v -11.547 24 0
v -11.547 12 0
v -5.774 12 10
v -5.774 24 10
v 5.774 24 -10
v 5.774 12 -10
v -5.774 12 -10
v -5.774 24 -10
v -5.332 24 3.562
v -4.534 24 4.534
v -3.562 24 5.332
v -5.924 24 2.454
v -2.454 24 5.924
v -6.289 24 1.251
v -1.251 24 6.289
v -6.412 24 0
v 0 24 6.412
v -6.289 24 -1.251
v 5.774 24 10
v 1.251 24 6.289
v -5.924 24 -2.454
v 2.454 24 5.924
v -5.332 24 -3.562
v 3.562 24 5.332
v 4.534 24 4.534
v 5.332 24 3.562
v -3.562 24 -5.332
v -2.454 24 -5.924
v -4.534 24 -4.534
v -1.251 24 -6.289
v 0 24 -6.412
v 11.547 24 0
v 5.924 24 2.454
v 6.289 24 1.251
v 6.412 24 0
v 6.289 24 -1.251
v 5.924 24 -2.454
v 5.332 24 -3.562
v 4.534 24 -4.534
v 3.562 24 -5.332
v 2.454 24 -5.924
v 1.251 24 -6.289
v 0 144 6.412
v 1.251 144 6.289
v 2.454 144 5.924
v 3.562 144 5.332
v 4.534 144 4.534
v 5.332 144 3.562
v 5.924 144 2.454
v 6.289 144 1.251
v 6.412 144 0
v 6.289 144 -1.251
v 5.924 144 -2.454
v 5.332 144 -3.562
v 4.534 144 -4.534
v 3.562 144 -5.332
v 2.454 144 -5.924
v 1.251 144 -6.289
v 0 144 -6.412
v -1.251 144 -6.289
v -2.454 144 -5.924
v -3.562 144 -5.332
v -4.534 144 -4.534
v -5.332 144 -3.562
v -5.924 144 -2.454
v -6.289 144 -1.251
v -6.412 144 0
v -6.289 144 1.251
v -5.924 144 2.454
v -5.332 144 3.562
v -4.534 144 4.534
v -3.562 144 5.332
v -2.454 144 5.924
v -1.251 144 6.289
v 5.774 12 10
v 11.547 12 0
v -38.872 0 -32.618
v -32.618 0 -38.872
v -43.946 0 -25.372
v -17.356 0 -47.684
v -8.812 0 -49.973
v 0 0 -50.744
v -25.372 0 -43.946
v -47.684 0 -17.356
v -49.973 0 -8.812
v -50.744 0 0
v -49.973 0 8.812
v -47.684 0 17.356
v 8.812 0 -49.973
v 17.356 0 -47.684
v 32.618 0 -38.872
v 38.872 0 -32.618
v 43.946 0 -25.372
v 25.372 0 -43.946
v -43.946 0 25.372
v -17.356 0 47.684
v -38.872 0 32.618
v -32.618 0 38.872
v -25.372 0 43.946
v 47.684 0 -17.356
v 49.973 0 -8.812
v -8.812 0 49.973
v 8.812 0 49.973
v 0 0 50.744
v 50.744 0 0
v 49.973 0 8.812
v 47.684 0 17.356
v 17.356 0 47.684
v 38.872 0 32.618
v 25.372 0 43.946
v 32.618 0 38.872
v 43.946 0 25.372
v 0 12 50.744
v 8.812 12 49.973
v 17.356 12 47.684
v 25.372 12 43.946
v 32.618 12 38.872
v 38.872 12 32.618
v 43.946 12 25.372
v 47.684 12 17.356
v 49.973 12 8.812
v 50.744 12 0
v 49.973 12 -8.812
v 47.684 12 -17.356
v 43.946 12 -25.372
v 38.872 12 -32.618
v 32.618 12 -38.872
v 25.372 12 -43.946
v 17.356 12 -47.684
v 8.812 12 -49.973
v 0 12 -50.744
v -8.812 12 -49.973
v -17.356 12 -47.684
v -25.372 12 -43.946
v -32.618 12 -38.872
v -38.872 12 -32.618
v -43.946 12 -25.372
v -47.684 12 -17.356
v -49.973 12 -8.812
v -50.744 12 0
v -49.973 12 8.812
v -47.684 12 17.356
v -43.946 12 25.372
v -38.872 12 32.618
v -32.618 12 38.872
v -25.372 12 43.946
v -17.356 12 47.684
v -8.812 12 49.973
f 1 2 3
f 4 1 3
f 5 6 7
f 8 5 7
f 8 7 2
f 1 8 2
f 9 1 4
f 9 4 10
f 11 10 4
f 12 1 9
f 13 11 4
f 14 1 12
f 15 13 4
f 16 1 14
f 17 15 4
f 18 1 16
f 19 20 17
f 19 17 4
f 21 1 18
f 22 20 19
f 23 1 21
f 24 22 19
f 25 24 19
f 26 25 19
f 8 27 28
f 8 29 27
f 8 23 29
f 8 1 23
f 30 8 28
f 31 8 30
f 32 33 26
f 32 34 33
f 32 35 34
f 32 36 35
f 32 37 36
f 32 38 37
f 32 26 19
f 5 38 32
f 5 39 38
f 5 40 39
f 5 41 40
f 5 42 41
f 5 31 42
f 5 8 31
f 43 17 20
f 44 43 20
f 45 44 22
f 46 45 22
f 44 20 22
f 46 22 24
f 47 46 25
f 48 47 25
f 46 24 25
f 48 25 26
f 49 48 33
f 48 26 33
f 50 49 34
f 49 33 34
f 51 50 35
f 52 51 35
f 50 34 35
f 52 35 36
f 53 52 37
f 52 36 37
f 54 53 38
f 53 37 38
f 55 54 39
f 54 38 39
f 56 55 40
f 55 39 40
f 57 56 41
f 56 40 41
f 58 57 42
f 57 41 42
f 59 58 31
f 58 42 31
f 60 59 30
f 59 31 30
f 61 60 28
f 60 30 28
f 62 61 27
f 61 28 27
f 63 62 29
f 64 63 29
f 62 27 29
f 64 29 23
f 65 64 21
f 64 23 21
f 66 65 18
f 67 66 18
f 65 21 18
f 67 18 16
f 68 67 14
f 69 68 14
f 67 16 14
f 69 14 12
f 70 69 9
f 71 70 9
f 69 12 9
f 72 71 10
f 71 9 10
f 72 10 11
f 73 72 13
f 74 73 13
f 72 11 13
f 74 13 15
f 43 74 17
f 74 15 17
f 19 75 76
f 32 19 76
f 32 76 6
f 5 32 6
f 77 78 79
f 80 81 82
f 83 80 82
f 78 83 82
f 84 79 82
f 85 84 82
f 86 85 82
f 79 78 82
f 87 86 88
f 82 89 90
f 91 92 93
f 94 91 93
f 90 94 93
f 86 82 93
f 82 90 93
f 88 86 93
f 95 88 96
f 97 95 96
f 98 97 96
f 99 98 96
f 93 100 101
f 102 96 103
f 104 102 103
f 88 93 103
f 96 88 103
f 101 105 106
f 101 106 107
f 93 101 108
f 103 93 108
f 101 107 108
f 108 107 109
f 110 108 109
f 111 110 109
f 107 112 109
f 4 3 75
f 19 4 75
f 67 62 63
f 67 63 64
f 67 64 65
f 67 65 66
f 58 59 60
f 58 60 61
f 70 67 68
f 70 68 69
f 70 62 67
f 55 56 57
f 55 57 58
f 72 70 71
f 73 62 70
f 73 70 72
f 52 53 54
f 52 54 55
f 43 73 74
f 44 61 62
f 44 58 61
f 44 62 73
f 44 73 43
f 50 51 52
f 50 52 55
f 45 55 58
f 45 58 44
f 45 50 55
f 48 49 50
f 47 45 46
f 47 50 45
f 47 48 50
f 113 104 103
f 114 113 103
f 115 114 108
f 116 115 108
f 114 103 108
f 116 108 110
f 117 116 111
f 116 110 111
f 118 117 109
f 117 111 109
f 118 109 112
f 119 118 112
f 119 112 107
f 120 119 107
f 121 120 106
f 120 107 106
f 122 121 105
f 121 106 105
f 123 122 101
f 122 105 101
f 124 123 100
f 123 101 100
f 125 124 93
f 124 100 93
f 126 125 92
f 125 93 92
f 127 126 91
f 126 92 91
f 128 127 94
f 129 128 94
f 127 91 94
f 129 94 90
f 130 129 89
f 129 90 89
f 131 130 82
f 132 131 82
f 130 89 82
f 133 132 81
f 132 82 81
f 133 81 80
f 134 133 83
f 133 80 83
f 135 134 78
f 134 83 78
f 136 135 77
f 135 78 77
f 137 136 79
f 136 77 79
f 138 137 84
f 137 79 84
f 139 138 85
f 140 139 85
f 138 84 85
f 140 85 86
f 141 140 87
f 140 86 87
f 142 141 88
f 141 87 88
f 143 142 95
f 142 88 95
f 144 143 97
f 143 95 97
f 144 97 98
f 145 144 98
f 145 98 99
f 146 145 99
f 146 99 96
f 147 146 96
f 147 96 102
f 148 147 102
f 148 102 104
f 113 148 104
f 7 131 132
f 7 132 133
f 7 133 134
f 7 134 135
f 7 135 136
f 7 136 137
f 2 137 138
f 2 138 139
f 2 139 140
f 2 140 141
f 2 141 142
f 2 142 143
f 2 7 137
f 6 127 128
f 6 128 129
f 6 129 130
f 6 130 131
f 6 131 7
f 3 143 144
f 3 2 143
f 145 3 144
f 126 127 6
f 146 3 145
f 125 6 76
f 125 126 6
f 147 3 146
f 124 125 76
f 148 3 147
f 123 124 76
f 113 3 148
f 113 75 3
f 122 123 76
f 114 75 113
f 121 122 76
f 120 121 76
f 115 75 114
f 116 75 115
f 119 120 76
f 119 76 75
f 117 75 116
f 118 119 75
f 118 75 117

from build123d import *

# Parameters (mm, degrees)
CROQUIS1_R              = 50.744242673
SALIENTE_EXTRUIR1_DEPTH = 12
SALIENTE_EXTRUIR2_DEPTH = 12
CROQUIS3_R              = 6.412213352
SALIENTE_EXTRUIR3_DEPTH = 120


with BuildPart() as part:
    # Croquis1 → Saliente-Extruir1 (new body)
    with BuildSketch(Plane(origin=(0, 0, 0), x_dir=(1, 0, 0), z_dir=(0, 1, 0))):
        with Locations(Location((0, 0, 0), (0, 0, 270))):
            Circle(CROQUIS1_R)
    extrude(amount=SALIENTE_EXTRUIR1_DEPTH)

    # Croquis2 → Saliente-Extruir2 (add)
    with BuildSketch(Plane(origin=(0, 12, 0), x_dir=(1, 0, 0), z_dir=(0, 1, 0))):
        Polygon((11.547005384, 0), (5.773502692, 10), (-5.773502692, 10), (-11.547005384, 0), (-5.773502692, -10), (5.773502692, -10), align=None)
    extrude(amount=SALIENTE_EXTRUIR2_DEPTH)

    # Croquis3 → Saliente-Extruir3 (add)
    with BuildSketch(Plane(origin=(0, 24, 0), x_dir=(1, 0, 0), z_dir=(0, 1, 0))):
        with Locations(Location((0, 0, 0), (0, 0, 270))):
            Circle(CROQUIS3_R)
    extrude(amount=SALIENTE_EXTRUIR3_DEPTH)


solid = part.part
